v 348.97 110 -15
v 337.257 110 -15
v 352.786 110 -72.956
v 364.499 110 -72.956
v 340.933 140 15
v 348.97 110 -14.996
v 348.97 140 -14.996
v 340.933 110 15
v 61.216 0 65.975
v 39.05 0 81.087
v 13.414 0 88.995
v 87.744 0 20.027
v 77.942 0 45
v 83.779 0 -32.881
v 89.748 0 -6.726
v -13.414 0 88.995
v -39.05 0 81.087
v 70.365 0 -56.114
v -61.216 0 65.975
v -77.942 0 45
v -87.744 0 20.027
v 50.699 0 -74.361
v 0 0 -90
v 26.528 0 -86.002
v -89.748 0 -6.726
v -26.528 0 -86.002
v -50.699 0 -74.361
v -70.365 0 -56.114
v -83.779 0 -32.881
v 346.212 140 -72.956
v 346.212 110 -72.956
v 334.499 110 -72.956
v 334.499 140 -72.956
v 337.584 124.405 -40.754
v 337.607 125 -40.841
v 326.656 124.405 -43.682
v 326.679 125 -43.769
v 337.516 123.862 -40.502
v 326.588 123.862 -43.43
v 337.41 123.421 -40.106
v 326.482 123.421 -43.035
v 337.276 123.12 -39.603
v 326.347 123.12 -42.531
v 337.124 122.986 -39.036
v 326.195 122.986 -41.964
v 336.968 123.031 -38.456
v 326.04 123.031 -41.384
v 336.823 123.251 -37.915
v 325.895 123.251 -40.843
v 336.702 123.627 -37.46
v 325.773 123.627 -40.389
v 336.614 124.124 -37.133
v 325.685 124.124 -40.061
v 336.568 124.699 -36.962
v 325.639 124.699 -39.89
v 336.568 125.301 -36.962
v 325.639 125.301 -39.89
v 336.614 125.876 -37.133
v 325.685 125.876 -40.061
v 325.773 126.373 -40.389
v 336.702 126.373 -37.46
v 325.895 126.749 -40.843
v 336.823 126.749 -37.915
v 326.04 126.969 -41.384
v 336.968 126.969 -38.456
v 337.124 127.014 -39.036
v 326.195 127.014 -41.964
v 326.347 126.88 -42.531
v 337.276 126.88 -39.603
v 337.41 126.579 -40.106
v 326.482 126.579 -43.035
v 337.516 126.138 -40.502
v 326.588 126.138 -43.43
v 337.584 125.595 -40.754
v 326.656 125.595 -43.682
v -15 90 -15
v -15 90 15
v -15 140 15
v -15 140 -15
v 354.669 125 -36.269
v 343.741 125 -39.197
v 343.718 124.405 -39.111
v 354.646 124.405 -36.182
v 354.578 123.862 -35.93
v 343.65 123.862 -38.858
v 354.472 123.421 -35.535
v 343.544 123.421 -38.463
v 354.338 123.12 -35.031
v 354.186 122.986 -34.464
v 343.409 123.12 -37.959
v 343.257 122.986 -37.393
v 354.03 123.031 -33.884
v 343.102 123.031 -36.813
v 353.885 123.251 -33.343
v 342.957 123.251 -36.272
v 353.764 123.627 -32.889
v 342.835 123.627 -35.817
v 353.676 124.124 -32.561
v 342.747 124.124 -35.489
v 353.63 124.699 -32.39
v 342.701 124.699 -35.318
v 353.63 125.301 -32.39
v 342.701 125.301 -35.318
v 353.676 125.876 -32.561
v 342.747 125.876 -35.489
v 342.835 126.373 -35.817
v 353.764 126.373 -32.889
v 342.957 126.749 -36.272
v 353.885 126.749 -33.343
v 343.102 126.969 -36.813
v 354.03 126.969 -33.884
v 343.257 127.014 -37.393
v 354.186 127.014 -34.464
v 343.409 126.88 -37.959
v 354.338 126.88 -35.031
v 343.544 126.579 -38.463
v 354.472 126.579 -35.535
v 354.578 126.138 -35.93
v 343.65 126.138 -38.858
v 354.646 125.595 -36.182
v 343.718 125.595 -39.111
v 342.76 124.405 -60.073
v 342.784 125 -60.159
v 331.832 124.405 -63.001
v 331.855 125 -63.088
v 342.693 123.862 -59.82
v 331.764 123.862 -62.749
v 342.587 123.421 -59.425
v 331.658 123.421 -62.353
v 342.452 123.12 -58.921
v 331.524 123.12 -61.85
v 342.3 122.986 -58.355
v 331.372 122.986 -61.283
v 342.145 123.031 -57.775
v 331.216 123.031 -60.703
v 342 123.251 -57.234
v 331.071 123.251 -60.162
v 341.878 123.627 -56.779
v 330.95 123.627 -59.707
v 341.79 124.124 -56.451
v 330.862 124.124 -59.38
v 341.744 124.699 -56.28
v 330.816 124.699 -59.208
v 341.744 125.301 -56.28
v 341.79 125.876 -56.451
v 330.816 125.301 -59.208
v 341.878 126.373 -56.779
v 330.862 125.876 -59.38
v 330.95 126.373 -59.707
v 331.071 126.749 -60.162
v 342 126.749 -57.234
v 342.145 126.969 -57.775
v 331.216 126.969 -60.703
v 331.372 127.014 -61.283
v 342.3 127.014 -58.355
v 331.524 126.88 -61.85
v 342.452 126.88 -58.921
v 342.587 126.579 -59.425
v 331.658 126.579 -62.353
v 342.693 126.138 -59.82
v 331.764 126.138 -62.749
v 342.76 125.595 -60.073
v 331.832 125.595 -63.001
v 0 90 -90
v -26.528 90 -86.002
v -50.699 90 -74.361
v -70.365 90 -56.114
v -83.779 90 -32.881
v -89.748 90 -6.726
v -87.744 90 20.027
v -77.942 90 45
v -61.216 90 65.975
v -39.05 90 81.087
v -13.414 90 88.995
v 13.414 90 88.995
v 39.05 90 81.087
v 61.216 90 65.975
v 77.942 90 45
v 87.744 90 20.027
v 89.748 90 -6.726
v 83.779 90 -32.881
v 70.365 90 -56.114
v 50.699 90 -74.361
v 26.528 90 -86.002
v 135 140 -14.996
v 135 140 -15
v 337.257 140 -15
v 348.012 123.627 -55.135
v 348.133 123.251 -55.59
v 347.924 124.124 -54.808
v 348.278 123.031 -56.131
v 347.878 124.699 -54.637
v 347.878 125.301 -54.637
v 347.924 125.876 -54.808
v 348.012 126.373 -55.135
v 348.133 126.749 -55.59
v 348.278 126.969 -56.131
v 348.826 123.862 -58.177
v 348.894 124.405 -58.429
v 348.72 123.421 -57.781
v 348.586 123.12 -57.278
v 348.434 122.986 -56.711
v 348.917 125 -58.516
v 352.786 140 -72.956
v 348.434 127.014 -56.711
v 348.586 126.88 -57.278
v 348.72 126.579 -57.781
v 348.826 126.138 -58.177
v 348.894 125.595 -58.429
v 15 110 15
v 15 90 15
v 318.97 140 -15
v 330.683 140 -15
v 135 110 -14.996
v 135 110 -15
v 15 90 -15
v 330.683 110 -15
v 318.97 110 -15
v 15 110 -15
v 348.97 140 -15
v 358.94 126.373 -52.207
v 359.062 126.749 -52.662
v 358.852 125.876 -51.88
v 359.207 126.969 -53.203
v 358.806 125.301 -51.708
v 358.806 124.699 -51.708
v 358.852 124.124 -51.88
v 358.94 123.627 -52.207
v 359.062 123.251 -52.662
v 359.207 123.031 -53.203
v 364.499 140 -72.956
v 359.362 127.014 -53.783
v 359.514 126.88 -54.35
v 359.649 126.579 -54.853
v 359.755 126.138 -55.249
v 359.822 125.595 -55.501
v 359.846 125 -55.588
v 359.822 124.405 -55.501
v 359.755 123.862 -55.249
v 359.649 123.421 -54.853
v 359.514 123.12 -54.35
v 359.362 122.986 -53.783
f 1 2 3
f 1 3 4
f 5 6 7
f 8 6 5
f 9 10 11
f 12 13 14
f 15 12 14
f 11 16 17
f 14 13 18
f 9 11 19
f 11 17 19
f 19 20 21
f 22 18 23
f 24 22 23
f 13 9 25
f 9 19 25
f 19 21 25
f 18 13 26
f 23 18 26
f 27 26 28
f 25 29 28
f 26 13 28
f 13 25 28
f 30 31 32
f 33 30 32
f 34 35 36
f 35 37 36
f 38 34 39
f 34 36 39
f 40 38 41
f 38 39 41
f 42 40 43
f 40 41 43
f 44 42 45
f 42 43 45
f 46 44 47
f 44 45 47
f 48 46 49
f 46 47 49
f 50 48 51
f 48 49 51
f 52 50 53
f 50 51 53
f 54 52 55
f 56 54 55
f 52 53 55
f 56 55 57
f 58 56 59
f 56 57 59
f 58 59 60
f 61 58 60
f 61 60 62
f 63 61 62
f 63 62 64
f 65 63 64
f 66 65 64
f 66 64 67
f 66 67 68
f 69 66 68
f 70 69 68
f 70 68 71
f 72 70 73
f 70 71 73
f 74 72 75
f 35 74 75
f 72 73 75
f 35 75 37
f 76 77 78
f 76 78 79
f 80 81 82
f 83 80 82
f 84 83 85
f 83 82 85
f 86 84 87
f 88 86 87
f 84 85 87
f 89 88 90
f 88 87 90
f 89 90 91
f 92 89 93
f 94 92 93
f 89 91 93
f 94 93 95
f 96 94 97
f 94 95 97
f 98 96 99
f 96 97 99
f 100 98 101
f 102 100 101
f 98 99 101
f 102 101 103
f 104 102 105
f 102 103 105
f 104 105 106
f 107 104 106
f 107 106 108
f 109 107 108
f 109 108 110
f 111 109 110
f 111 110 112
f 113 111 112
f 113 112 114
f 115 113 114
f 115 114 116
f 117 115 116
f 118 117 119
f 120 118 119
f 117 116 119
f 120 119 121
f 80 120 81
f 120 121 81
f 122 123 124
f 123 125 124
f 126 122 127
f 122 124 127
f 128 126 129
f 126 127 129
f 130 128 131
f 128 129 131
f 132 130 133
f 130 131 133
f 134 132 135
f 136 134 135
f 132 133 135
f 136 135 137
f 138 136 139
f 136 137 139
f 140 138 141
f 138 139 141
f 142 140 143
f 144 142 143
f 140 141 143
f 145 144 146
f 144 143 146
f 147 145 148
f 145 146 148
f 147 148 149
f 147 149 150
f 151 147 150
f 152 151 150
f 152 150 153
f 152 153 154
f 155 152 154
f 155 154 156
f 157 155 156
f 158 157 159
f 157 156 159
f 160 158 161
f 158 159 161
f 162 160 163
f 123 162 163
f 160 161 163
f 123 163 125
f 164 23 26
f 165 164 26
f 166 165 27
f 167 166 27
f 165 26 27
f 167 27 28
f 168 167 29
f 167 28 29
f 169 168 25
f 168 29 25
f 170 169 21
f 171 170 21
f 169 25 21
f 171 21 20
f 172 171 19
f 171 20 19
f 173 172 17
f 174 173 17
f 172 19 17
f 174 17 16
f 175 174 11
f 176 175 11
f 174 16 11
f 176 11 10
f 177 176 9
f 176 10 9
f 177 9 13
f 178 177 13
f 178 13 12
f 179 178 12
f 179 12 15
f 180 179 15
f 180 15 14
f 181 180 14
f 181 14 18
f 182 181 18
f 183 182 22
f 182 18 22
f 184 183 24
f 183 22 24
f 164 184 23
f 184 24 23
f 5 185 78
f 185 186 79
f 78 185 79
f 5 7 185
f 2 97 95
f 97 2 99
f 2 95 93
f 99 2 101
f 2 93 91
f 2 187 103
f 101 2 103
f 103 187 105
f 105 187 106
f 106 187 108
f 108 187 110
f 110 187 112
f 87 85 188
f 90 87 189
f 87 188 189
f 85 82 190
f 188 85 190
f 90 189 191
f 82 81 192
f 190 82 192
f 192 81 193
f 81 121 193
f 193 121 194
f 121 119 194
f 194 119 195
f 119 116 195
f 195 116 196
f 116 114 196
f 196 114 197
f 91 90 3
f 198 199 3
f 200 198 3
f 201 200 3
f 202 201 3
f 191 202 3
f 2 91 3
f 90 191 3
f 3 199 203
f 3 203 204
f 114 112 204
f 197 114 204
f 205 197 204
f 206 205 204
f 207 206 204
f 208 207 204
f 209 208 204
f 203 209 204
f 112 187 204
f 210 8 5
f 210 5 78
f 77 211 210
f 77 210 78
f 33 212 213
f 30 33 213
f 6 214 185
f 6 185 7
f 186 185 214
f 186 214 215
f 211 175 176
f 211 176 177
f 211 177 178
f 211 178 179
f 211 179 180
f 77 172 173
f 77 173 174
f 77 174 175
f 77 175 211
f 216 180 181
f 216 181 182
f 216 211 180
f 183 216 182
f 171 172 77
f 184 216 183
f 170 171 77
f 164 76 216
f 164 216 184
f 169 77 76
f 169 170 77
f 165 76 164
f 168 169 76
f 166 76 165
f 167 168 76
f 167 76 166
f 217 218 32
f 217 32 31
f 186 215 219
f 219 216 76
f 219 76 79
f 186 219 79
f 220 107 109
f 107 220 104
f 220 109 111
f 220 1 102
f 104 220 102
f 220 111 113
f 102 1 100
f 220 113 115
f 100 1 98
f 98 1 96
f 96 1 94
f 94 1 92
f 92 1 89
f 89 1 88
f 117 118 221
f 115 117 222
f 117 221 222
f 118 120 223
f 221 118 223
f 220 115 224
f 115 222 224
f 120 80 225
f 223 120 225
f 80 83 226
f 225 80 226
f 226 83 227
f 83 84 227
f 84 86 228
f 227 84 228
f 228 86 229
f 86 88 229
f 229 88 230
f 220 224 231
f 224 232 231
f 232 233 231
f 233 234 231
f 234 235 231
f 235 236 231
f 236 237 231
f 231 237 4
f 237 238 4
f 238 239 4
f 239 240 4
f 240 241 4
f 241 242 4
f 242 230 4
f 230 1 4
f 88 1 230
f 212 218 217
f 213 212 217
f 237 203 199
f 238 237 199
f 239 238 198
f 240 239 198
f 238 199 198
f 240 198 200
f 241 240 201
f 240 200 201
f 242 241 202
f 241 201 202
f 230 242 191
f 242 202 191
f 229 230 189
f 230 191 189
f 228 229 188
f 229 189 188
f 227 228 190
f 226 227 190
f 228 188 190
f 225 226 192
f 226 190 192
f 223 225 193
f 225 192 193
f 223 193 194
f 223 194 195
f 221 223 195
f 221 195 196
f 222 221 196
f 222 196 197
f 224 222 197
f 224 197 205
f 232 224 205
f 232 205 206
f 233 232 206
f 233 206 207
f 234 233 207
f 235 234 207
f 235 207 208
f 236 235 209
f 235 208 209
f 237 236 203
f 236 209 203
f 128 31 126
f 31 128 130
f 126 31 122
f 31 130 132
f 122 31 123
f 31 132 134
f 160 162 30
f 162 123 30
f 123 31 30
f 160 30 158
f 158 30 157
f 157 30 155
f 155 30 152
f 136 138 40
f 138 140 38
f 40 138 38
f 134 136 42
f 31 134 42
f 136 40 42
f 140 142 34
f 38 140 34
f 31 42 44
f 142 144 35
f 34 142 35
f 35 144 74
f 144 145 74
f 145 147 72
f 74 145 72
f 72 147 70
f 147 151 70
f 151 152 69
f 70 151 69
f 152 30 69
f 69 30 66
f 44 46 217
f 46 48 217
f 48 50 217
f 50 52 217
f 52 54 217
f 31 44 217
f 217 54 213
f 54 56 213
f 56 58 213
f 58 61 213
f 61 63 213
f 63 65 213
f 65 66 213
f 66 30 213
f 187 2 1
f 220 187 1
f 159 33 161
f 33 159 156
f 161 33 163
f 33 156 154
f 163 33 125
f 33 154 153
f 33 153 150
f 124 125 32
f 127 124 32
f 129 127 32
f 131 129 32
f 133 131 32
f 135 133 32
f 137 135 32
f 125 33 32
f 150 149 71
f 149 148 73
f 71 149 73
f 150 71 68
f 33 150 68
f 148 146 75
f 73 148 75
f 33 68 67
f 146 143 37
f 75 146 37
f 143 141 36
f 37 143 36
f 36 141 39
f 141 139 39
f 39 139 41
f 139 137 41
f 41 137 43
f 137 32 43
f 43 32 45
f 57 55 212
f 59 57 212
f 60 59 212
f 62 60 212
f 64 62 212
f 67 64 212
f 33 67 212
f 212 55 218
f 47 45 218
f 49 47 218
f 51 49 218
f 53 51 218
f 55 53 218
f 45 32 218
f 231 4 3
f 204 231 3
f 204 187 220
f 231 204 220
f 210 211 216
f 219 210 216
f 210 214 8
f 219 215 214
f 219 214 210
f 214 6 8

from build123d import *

# Parameters (mm, degrees)
SKETCH1_R                       = 90
BOSS_EXTRUDE1_DEPTH             = 90
SKETCH2_W                       = 30
SKETCH2_H                       = 30
BOSS_EXTRUDE2_DEPTH             = 50
SKETCH3_W                       = 30
SKETCH3_H                       = 30
BOSS_EXTRUDE3_DEPTH             = 120
BOSS_EXTRUDE4_START             = -30
BOSS_EXTRUDE4_DEPTH             = 30
BOSS_EXTRUDE5_START             = 110
BOSS_EXTRUDE5_DEPTH             = 30
CUT_EXTRUDE1_DEPTH              = 30
SKETCH8_W                       = 2.0193
SKETCH8_H                       = 443.424131357
F_10_32_TAPPED_HOLE1_AT_2_COUNT = 2
F_10_32_TAPPED_HOLE1_AT_2_PITCH = 20


# Read off the part's stored shape, not the designer's step: Boss-Extrude5
with BuildPart() as part:
    # Sketch1 → Boss-Extrude1 (new body)
    with BuildSketch(Plane(origin=(0, 0, 0), x_dir=(1, 0, 0), z_dir=(0, 1, 0))):
        with Locations(Location((0, 0, 0), (0, 0, 90))):
            Circle(SKETCH1_R)
    extrude(amount=BOSS_EXTRUDE1_DEPTH)

    # Sketch2 → Boss-Extrude2 (add)
    with BuildSketch(Plane(origin=(0, 90, 0), x_dir=(1, 0, 0), z_dir=(0, 1, 0))):
        Rectangle(SKETCH2_W, SKETCH2_H)
    extrude(amount=BOSS_EXTRUDE2_DEPTH)

    # Sketch3 → Boss-Extrude3 (add)
    with BuildSketch(Plane(origin=(15, 0, 0), x_dir=(0, 0, -1), z_dir=(1, 0, 0))):
        with Locations((0, 125)):
            Rectangle(SKETCH3_W, SKETCH3_H)
    extrude(amount=BOSS_EXTRUDE3_DEPTH)

    # Sketch4 → Boss-Extrude4 (add)
    with BuildSketch(Plane(origin=(0, 140, 0), x_dir=(1, 0, 0), z_dir=(0, 1, 0)).offset(BOSS_EXTRUDE4_START)):
        Polygon((348.970251581, 14.996296245), (340.932768226, -15), (135, -15), (135, 14.996296245), align=None)
    extrude(amount=BOSS_EXTRUDE4_DEPTH)


with BuildPart() as body_2:
    # Boss-Extrude5 outline → Boss-Extrude5 (new body)
    with BuildSketch(Plane(origin=(0, 0, 0), x_dir=(1, 0, 0), z_dir=(0, 1, 0)).offset(BOSS_EXTRUDE5_START)):
        Polygon((348.970251581, 15), (364.499394287, 72.955549577), (334.499394287, 72.955549577), (318.970251581, 15), align=None)
    extrude(amount=BOSS_EXTRUDE5_DEPTH)

    # Sketch6 → Cut-Extrude1 (cut)
    with BuildSketch(Plane(origin=(0, 140, 0), x_dir=(1, 0, 0), z_dir=(0, 1, 0))):
        Polygon((337.257253453, 15), (352.78639616, 72.955549577), (346.212392414, 72.955549577), (330.683249708, 15), align=None)
    extrude(amount=-CUT_EXTRUDE1_DEPTH, mode=Mode.SUBTRACT)


with BuildPart() as cut_extrude1_piece_1:
    # of the separate pieces the step leaves, piece 1, a body of its own (cut_extrude1_pieces)
    add(body_2.part.solids().sort_by_distance((348.970251581, 110, -15))[0])


with BuildPart() as cut_extrude1_piece_2:
    # of the separate pieces the step leaves, piece 2, a body of its own (cut_extrude1_pieces)
    add(body_2.part.solids().sort_by_distance((318.970251581, 110, -15))[0])


with BuildPart() as f_10_32_tapped_hole1_tool:
    # Sketch8 → #10-32 Tapped Hole1 (revolve)
    with BuildSketch(Plane(origin=(359.323013385, 125, -53.637033052), x_dir=(0.2588190451025241, 0, -0.9659258262890675), z_dir=(0, 1, 0))):
        with Locations((1.00965, 221.712065679)):
            Rectangle(SKETCH8_W, SKETCH8_H)
    f_10_32_tapped_hole1 = revolve(axis=Axis((365.456642382, 125, -51.993532115), (-0.9659258262890674, 0, -0.2588190451025241)))


with BuildPart() as cut_extrude1_piece_1_1:
    add(cut_extrude1_piece_1.part)

    # #10-32 Tapped Hole1: cut by f_10_32_tapped_hole1_tool
    add(f_10_32_tapped_hole1_tool.part, mode=Mode.SUBTRACT)


with BuildPart() as cut_extrude1_piece_2_1:
    add(cut_extrude1_piece_2.part)

    # #10-32 Tapped Hole1: cut by f_10_32_tapped_hole1_tool
    add(f_10_32_tapped_hole1_tool.part, mode=Mode.SUBTRACT)


with BuildPart() as f_10_32_tapped_hole1_at_2_tool:
    # #10-32 Tapped Hole1 at 2: #10-32 Tapped Hole1 ×2
    with Locations(*[Vector(-0.2588190451025241, 0, 0.9659258262890674) * (i * F_10_32_TAPPED_HOLE1_AT_2_PITCH) for i in range(1, F_10_32_TAPPED_HOLE1_AT_2_COUNT)]):
        add(f_10_32_tapped_hole1)


with BuildPart() as cut_extrude1_piece_1_2:
    add(cut_extrude1_piece_1_1.part)

    # #10-32 Tapped Hole1 at 2: cut by f_10_32_tapped_hole1_at_2_tool
    add(f_10_32_tapped_hole1_at_2_tool.part, mode=Mode.SUBTRACT)


with BuildPart() as cut_extrude1_piece_2_2:
    add(cut_extrude1_piece_2_1.part)

    # #10-32 Tapped Hole1 at 2: cut by f_10_32_tapped_hole1_at_2_tool
    add(f_10_32_tapped_hole1_at_2_tool.part, mode=Mode.SUBTRACT)


solid = Compound([part.part, cut_extrude1_piece_1_2.part, cut_extrude1_piece_2_2.part])
